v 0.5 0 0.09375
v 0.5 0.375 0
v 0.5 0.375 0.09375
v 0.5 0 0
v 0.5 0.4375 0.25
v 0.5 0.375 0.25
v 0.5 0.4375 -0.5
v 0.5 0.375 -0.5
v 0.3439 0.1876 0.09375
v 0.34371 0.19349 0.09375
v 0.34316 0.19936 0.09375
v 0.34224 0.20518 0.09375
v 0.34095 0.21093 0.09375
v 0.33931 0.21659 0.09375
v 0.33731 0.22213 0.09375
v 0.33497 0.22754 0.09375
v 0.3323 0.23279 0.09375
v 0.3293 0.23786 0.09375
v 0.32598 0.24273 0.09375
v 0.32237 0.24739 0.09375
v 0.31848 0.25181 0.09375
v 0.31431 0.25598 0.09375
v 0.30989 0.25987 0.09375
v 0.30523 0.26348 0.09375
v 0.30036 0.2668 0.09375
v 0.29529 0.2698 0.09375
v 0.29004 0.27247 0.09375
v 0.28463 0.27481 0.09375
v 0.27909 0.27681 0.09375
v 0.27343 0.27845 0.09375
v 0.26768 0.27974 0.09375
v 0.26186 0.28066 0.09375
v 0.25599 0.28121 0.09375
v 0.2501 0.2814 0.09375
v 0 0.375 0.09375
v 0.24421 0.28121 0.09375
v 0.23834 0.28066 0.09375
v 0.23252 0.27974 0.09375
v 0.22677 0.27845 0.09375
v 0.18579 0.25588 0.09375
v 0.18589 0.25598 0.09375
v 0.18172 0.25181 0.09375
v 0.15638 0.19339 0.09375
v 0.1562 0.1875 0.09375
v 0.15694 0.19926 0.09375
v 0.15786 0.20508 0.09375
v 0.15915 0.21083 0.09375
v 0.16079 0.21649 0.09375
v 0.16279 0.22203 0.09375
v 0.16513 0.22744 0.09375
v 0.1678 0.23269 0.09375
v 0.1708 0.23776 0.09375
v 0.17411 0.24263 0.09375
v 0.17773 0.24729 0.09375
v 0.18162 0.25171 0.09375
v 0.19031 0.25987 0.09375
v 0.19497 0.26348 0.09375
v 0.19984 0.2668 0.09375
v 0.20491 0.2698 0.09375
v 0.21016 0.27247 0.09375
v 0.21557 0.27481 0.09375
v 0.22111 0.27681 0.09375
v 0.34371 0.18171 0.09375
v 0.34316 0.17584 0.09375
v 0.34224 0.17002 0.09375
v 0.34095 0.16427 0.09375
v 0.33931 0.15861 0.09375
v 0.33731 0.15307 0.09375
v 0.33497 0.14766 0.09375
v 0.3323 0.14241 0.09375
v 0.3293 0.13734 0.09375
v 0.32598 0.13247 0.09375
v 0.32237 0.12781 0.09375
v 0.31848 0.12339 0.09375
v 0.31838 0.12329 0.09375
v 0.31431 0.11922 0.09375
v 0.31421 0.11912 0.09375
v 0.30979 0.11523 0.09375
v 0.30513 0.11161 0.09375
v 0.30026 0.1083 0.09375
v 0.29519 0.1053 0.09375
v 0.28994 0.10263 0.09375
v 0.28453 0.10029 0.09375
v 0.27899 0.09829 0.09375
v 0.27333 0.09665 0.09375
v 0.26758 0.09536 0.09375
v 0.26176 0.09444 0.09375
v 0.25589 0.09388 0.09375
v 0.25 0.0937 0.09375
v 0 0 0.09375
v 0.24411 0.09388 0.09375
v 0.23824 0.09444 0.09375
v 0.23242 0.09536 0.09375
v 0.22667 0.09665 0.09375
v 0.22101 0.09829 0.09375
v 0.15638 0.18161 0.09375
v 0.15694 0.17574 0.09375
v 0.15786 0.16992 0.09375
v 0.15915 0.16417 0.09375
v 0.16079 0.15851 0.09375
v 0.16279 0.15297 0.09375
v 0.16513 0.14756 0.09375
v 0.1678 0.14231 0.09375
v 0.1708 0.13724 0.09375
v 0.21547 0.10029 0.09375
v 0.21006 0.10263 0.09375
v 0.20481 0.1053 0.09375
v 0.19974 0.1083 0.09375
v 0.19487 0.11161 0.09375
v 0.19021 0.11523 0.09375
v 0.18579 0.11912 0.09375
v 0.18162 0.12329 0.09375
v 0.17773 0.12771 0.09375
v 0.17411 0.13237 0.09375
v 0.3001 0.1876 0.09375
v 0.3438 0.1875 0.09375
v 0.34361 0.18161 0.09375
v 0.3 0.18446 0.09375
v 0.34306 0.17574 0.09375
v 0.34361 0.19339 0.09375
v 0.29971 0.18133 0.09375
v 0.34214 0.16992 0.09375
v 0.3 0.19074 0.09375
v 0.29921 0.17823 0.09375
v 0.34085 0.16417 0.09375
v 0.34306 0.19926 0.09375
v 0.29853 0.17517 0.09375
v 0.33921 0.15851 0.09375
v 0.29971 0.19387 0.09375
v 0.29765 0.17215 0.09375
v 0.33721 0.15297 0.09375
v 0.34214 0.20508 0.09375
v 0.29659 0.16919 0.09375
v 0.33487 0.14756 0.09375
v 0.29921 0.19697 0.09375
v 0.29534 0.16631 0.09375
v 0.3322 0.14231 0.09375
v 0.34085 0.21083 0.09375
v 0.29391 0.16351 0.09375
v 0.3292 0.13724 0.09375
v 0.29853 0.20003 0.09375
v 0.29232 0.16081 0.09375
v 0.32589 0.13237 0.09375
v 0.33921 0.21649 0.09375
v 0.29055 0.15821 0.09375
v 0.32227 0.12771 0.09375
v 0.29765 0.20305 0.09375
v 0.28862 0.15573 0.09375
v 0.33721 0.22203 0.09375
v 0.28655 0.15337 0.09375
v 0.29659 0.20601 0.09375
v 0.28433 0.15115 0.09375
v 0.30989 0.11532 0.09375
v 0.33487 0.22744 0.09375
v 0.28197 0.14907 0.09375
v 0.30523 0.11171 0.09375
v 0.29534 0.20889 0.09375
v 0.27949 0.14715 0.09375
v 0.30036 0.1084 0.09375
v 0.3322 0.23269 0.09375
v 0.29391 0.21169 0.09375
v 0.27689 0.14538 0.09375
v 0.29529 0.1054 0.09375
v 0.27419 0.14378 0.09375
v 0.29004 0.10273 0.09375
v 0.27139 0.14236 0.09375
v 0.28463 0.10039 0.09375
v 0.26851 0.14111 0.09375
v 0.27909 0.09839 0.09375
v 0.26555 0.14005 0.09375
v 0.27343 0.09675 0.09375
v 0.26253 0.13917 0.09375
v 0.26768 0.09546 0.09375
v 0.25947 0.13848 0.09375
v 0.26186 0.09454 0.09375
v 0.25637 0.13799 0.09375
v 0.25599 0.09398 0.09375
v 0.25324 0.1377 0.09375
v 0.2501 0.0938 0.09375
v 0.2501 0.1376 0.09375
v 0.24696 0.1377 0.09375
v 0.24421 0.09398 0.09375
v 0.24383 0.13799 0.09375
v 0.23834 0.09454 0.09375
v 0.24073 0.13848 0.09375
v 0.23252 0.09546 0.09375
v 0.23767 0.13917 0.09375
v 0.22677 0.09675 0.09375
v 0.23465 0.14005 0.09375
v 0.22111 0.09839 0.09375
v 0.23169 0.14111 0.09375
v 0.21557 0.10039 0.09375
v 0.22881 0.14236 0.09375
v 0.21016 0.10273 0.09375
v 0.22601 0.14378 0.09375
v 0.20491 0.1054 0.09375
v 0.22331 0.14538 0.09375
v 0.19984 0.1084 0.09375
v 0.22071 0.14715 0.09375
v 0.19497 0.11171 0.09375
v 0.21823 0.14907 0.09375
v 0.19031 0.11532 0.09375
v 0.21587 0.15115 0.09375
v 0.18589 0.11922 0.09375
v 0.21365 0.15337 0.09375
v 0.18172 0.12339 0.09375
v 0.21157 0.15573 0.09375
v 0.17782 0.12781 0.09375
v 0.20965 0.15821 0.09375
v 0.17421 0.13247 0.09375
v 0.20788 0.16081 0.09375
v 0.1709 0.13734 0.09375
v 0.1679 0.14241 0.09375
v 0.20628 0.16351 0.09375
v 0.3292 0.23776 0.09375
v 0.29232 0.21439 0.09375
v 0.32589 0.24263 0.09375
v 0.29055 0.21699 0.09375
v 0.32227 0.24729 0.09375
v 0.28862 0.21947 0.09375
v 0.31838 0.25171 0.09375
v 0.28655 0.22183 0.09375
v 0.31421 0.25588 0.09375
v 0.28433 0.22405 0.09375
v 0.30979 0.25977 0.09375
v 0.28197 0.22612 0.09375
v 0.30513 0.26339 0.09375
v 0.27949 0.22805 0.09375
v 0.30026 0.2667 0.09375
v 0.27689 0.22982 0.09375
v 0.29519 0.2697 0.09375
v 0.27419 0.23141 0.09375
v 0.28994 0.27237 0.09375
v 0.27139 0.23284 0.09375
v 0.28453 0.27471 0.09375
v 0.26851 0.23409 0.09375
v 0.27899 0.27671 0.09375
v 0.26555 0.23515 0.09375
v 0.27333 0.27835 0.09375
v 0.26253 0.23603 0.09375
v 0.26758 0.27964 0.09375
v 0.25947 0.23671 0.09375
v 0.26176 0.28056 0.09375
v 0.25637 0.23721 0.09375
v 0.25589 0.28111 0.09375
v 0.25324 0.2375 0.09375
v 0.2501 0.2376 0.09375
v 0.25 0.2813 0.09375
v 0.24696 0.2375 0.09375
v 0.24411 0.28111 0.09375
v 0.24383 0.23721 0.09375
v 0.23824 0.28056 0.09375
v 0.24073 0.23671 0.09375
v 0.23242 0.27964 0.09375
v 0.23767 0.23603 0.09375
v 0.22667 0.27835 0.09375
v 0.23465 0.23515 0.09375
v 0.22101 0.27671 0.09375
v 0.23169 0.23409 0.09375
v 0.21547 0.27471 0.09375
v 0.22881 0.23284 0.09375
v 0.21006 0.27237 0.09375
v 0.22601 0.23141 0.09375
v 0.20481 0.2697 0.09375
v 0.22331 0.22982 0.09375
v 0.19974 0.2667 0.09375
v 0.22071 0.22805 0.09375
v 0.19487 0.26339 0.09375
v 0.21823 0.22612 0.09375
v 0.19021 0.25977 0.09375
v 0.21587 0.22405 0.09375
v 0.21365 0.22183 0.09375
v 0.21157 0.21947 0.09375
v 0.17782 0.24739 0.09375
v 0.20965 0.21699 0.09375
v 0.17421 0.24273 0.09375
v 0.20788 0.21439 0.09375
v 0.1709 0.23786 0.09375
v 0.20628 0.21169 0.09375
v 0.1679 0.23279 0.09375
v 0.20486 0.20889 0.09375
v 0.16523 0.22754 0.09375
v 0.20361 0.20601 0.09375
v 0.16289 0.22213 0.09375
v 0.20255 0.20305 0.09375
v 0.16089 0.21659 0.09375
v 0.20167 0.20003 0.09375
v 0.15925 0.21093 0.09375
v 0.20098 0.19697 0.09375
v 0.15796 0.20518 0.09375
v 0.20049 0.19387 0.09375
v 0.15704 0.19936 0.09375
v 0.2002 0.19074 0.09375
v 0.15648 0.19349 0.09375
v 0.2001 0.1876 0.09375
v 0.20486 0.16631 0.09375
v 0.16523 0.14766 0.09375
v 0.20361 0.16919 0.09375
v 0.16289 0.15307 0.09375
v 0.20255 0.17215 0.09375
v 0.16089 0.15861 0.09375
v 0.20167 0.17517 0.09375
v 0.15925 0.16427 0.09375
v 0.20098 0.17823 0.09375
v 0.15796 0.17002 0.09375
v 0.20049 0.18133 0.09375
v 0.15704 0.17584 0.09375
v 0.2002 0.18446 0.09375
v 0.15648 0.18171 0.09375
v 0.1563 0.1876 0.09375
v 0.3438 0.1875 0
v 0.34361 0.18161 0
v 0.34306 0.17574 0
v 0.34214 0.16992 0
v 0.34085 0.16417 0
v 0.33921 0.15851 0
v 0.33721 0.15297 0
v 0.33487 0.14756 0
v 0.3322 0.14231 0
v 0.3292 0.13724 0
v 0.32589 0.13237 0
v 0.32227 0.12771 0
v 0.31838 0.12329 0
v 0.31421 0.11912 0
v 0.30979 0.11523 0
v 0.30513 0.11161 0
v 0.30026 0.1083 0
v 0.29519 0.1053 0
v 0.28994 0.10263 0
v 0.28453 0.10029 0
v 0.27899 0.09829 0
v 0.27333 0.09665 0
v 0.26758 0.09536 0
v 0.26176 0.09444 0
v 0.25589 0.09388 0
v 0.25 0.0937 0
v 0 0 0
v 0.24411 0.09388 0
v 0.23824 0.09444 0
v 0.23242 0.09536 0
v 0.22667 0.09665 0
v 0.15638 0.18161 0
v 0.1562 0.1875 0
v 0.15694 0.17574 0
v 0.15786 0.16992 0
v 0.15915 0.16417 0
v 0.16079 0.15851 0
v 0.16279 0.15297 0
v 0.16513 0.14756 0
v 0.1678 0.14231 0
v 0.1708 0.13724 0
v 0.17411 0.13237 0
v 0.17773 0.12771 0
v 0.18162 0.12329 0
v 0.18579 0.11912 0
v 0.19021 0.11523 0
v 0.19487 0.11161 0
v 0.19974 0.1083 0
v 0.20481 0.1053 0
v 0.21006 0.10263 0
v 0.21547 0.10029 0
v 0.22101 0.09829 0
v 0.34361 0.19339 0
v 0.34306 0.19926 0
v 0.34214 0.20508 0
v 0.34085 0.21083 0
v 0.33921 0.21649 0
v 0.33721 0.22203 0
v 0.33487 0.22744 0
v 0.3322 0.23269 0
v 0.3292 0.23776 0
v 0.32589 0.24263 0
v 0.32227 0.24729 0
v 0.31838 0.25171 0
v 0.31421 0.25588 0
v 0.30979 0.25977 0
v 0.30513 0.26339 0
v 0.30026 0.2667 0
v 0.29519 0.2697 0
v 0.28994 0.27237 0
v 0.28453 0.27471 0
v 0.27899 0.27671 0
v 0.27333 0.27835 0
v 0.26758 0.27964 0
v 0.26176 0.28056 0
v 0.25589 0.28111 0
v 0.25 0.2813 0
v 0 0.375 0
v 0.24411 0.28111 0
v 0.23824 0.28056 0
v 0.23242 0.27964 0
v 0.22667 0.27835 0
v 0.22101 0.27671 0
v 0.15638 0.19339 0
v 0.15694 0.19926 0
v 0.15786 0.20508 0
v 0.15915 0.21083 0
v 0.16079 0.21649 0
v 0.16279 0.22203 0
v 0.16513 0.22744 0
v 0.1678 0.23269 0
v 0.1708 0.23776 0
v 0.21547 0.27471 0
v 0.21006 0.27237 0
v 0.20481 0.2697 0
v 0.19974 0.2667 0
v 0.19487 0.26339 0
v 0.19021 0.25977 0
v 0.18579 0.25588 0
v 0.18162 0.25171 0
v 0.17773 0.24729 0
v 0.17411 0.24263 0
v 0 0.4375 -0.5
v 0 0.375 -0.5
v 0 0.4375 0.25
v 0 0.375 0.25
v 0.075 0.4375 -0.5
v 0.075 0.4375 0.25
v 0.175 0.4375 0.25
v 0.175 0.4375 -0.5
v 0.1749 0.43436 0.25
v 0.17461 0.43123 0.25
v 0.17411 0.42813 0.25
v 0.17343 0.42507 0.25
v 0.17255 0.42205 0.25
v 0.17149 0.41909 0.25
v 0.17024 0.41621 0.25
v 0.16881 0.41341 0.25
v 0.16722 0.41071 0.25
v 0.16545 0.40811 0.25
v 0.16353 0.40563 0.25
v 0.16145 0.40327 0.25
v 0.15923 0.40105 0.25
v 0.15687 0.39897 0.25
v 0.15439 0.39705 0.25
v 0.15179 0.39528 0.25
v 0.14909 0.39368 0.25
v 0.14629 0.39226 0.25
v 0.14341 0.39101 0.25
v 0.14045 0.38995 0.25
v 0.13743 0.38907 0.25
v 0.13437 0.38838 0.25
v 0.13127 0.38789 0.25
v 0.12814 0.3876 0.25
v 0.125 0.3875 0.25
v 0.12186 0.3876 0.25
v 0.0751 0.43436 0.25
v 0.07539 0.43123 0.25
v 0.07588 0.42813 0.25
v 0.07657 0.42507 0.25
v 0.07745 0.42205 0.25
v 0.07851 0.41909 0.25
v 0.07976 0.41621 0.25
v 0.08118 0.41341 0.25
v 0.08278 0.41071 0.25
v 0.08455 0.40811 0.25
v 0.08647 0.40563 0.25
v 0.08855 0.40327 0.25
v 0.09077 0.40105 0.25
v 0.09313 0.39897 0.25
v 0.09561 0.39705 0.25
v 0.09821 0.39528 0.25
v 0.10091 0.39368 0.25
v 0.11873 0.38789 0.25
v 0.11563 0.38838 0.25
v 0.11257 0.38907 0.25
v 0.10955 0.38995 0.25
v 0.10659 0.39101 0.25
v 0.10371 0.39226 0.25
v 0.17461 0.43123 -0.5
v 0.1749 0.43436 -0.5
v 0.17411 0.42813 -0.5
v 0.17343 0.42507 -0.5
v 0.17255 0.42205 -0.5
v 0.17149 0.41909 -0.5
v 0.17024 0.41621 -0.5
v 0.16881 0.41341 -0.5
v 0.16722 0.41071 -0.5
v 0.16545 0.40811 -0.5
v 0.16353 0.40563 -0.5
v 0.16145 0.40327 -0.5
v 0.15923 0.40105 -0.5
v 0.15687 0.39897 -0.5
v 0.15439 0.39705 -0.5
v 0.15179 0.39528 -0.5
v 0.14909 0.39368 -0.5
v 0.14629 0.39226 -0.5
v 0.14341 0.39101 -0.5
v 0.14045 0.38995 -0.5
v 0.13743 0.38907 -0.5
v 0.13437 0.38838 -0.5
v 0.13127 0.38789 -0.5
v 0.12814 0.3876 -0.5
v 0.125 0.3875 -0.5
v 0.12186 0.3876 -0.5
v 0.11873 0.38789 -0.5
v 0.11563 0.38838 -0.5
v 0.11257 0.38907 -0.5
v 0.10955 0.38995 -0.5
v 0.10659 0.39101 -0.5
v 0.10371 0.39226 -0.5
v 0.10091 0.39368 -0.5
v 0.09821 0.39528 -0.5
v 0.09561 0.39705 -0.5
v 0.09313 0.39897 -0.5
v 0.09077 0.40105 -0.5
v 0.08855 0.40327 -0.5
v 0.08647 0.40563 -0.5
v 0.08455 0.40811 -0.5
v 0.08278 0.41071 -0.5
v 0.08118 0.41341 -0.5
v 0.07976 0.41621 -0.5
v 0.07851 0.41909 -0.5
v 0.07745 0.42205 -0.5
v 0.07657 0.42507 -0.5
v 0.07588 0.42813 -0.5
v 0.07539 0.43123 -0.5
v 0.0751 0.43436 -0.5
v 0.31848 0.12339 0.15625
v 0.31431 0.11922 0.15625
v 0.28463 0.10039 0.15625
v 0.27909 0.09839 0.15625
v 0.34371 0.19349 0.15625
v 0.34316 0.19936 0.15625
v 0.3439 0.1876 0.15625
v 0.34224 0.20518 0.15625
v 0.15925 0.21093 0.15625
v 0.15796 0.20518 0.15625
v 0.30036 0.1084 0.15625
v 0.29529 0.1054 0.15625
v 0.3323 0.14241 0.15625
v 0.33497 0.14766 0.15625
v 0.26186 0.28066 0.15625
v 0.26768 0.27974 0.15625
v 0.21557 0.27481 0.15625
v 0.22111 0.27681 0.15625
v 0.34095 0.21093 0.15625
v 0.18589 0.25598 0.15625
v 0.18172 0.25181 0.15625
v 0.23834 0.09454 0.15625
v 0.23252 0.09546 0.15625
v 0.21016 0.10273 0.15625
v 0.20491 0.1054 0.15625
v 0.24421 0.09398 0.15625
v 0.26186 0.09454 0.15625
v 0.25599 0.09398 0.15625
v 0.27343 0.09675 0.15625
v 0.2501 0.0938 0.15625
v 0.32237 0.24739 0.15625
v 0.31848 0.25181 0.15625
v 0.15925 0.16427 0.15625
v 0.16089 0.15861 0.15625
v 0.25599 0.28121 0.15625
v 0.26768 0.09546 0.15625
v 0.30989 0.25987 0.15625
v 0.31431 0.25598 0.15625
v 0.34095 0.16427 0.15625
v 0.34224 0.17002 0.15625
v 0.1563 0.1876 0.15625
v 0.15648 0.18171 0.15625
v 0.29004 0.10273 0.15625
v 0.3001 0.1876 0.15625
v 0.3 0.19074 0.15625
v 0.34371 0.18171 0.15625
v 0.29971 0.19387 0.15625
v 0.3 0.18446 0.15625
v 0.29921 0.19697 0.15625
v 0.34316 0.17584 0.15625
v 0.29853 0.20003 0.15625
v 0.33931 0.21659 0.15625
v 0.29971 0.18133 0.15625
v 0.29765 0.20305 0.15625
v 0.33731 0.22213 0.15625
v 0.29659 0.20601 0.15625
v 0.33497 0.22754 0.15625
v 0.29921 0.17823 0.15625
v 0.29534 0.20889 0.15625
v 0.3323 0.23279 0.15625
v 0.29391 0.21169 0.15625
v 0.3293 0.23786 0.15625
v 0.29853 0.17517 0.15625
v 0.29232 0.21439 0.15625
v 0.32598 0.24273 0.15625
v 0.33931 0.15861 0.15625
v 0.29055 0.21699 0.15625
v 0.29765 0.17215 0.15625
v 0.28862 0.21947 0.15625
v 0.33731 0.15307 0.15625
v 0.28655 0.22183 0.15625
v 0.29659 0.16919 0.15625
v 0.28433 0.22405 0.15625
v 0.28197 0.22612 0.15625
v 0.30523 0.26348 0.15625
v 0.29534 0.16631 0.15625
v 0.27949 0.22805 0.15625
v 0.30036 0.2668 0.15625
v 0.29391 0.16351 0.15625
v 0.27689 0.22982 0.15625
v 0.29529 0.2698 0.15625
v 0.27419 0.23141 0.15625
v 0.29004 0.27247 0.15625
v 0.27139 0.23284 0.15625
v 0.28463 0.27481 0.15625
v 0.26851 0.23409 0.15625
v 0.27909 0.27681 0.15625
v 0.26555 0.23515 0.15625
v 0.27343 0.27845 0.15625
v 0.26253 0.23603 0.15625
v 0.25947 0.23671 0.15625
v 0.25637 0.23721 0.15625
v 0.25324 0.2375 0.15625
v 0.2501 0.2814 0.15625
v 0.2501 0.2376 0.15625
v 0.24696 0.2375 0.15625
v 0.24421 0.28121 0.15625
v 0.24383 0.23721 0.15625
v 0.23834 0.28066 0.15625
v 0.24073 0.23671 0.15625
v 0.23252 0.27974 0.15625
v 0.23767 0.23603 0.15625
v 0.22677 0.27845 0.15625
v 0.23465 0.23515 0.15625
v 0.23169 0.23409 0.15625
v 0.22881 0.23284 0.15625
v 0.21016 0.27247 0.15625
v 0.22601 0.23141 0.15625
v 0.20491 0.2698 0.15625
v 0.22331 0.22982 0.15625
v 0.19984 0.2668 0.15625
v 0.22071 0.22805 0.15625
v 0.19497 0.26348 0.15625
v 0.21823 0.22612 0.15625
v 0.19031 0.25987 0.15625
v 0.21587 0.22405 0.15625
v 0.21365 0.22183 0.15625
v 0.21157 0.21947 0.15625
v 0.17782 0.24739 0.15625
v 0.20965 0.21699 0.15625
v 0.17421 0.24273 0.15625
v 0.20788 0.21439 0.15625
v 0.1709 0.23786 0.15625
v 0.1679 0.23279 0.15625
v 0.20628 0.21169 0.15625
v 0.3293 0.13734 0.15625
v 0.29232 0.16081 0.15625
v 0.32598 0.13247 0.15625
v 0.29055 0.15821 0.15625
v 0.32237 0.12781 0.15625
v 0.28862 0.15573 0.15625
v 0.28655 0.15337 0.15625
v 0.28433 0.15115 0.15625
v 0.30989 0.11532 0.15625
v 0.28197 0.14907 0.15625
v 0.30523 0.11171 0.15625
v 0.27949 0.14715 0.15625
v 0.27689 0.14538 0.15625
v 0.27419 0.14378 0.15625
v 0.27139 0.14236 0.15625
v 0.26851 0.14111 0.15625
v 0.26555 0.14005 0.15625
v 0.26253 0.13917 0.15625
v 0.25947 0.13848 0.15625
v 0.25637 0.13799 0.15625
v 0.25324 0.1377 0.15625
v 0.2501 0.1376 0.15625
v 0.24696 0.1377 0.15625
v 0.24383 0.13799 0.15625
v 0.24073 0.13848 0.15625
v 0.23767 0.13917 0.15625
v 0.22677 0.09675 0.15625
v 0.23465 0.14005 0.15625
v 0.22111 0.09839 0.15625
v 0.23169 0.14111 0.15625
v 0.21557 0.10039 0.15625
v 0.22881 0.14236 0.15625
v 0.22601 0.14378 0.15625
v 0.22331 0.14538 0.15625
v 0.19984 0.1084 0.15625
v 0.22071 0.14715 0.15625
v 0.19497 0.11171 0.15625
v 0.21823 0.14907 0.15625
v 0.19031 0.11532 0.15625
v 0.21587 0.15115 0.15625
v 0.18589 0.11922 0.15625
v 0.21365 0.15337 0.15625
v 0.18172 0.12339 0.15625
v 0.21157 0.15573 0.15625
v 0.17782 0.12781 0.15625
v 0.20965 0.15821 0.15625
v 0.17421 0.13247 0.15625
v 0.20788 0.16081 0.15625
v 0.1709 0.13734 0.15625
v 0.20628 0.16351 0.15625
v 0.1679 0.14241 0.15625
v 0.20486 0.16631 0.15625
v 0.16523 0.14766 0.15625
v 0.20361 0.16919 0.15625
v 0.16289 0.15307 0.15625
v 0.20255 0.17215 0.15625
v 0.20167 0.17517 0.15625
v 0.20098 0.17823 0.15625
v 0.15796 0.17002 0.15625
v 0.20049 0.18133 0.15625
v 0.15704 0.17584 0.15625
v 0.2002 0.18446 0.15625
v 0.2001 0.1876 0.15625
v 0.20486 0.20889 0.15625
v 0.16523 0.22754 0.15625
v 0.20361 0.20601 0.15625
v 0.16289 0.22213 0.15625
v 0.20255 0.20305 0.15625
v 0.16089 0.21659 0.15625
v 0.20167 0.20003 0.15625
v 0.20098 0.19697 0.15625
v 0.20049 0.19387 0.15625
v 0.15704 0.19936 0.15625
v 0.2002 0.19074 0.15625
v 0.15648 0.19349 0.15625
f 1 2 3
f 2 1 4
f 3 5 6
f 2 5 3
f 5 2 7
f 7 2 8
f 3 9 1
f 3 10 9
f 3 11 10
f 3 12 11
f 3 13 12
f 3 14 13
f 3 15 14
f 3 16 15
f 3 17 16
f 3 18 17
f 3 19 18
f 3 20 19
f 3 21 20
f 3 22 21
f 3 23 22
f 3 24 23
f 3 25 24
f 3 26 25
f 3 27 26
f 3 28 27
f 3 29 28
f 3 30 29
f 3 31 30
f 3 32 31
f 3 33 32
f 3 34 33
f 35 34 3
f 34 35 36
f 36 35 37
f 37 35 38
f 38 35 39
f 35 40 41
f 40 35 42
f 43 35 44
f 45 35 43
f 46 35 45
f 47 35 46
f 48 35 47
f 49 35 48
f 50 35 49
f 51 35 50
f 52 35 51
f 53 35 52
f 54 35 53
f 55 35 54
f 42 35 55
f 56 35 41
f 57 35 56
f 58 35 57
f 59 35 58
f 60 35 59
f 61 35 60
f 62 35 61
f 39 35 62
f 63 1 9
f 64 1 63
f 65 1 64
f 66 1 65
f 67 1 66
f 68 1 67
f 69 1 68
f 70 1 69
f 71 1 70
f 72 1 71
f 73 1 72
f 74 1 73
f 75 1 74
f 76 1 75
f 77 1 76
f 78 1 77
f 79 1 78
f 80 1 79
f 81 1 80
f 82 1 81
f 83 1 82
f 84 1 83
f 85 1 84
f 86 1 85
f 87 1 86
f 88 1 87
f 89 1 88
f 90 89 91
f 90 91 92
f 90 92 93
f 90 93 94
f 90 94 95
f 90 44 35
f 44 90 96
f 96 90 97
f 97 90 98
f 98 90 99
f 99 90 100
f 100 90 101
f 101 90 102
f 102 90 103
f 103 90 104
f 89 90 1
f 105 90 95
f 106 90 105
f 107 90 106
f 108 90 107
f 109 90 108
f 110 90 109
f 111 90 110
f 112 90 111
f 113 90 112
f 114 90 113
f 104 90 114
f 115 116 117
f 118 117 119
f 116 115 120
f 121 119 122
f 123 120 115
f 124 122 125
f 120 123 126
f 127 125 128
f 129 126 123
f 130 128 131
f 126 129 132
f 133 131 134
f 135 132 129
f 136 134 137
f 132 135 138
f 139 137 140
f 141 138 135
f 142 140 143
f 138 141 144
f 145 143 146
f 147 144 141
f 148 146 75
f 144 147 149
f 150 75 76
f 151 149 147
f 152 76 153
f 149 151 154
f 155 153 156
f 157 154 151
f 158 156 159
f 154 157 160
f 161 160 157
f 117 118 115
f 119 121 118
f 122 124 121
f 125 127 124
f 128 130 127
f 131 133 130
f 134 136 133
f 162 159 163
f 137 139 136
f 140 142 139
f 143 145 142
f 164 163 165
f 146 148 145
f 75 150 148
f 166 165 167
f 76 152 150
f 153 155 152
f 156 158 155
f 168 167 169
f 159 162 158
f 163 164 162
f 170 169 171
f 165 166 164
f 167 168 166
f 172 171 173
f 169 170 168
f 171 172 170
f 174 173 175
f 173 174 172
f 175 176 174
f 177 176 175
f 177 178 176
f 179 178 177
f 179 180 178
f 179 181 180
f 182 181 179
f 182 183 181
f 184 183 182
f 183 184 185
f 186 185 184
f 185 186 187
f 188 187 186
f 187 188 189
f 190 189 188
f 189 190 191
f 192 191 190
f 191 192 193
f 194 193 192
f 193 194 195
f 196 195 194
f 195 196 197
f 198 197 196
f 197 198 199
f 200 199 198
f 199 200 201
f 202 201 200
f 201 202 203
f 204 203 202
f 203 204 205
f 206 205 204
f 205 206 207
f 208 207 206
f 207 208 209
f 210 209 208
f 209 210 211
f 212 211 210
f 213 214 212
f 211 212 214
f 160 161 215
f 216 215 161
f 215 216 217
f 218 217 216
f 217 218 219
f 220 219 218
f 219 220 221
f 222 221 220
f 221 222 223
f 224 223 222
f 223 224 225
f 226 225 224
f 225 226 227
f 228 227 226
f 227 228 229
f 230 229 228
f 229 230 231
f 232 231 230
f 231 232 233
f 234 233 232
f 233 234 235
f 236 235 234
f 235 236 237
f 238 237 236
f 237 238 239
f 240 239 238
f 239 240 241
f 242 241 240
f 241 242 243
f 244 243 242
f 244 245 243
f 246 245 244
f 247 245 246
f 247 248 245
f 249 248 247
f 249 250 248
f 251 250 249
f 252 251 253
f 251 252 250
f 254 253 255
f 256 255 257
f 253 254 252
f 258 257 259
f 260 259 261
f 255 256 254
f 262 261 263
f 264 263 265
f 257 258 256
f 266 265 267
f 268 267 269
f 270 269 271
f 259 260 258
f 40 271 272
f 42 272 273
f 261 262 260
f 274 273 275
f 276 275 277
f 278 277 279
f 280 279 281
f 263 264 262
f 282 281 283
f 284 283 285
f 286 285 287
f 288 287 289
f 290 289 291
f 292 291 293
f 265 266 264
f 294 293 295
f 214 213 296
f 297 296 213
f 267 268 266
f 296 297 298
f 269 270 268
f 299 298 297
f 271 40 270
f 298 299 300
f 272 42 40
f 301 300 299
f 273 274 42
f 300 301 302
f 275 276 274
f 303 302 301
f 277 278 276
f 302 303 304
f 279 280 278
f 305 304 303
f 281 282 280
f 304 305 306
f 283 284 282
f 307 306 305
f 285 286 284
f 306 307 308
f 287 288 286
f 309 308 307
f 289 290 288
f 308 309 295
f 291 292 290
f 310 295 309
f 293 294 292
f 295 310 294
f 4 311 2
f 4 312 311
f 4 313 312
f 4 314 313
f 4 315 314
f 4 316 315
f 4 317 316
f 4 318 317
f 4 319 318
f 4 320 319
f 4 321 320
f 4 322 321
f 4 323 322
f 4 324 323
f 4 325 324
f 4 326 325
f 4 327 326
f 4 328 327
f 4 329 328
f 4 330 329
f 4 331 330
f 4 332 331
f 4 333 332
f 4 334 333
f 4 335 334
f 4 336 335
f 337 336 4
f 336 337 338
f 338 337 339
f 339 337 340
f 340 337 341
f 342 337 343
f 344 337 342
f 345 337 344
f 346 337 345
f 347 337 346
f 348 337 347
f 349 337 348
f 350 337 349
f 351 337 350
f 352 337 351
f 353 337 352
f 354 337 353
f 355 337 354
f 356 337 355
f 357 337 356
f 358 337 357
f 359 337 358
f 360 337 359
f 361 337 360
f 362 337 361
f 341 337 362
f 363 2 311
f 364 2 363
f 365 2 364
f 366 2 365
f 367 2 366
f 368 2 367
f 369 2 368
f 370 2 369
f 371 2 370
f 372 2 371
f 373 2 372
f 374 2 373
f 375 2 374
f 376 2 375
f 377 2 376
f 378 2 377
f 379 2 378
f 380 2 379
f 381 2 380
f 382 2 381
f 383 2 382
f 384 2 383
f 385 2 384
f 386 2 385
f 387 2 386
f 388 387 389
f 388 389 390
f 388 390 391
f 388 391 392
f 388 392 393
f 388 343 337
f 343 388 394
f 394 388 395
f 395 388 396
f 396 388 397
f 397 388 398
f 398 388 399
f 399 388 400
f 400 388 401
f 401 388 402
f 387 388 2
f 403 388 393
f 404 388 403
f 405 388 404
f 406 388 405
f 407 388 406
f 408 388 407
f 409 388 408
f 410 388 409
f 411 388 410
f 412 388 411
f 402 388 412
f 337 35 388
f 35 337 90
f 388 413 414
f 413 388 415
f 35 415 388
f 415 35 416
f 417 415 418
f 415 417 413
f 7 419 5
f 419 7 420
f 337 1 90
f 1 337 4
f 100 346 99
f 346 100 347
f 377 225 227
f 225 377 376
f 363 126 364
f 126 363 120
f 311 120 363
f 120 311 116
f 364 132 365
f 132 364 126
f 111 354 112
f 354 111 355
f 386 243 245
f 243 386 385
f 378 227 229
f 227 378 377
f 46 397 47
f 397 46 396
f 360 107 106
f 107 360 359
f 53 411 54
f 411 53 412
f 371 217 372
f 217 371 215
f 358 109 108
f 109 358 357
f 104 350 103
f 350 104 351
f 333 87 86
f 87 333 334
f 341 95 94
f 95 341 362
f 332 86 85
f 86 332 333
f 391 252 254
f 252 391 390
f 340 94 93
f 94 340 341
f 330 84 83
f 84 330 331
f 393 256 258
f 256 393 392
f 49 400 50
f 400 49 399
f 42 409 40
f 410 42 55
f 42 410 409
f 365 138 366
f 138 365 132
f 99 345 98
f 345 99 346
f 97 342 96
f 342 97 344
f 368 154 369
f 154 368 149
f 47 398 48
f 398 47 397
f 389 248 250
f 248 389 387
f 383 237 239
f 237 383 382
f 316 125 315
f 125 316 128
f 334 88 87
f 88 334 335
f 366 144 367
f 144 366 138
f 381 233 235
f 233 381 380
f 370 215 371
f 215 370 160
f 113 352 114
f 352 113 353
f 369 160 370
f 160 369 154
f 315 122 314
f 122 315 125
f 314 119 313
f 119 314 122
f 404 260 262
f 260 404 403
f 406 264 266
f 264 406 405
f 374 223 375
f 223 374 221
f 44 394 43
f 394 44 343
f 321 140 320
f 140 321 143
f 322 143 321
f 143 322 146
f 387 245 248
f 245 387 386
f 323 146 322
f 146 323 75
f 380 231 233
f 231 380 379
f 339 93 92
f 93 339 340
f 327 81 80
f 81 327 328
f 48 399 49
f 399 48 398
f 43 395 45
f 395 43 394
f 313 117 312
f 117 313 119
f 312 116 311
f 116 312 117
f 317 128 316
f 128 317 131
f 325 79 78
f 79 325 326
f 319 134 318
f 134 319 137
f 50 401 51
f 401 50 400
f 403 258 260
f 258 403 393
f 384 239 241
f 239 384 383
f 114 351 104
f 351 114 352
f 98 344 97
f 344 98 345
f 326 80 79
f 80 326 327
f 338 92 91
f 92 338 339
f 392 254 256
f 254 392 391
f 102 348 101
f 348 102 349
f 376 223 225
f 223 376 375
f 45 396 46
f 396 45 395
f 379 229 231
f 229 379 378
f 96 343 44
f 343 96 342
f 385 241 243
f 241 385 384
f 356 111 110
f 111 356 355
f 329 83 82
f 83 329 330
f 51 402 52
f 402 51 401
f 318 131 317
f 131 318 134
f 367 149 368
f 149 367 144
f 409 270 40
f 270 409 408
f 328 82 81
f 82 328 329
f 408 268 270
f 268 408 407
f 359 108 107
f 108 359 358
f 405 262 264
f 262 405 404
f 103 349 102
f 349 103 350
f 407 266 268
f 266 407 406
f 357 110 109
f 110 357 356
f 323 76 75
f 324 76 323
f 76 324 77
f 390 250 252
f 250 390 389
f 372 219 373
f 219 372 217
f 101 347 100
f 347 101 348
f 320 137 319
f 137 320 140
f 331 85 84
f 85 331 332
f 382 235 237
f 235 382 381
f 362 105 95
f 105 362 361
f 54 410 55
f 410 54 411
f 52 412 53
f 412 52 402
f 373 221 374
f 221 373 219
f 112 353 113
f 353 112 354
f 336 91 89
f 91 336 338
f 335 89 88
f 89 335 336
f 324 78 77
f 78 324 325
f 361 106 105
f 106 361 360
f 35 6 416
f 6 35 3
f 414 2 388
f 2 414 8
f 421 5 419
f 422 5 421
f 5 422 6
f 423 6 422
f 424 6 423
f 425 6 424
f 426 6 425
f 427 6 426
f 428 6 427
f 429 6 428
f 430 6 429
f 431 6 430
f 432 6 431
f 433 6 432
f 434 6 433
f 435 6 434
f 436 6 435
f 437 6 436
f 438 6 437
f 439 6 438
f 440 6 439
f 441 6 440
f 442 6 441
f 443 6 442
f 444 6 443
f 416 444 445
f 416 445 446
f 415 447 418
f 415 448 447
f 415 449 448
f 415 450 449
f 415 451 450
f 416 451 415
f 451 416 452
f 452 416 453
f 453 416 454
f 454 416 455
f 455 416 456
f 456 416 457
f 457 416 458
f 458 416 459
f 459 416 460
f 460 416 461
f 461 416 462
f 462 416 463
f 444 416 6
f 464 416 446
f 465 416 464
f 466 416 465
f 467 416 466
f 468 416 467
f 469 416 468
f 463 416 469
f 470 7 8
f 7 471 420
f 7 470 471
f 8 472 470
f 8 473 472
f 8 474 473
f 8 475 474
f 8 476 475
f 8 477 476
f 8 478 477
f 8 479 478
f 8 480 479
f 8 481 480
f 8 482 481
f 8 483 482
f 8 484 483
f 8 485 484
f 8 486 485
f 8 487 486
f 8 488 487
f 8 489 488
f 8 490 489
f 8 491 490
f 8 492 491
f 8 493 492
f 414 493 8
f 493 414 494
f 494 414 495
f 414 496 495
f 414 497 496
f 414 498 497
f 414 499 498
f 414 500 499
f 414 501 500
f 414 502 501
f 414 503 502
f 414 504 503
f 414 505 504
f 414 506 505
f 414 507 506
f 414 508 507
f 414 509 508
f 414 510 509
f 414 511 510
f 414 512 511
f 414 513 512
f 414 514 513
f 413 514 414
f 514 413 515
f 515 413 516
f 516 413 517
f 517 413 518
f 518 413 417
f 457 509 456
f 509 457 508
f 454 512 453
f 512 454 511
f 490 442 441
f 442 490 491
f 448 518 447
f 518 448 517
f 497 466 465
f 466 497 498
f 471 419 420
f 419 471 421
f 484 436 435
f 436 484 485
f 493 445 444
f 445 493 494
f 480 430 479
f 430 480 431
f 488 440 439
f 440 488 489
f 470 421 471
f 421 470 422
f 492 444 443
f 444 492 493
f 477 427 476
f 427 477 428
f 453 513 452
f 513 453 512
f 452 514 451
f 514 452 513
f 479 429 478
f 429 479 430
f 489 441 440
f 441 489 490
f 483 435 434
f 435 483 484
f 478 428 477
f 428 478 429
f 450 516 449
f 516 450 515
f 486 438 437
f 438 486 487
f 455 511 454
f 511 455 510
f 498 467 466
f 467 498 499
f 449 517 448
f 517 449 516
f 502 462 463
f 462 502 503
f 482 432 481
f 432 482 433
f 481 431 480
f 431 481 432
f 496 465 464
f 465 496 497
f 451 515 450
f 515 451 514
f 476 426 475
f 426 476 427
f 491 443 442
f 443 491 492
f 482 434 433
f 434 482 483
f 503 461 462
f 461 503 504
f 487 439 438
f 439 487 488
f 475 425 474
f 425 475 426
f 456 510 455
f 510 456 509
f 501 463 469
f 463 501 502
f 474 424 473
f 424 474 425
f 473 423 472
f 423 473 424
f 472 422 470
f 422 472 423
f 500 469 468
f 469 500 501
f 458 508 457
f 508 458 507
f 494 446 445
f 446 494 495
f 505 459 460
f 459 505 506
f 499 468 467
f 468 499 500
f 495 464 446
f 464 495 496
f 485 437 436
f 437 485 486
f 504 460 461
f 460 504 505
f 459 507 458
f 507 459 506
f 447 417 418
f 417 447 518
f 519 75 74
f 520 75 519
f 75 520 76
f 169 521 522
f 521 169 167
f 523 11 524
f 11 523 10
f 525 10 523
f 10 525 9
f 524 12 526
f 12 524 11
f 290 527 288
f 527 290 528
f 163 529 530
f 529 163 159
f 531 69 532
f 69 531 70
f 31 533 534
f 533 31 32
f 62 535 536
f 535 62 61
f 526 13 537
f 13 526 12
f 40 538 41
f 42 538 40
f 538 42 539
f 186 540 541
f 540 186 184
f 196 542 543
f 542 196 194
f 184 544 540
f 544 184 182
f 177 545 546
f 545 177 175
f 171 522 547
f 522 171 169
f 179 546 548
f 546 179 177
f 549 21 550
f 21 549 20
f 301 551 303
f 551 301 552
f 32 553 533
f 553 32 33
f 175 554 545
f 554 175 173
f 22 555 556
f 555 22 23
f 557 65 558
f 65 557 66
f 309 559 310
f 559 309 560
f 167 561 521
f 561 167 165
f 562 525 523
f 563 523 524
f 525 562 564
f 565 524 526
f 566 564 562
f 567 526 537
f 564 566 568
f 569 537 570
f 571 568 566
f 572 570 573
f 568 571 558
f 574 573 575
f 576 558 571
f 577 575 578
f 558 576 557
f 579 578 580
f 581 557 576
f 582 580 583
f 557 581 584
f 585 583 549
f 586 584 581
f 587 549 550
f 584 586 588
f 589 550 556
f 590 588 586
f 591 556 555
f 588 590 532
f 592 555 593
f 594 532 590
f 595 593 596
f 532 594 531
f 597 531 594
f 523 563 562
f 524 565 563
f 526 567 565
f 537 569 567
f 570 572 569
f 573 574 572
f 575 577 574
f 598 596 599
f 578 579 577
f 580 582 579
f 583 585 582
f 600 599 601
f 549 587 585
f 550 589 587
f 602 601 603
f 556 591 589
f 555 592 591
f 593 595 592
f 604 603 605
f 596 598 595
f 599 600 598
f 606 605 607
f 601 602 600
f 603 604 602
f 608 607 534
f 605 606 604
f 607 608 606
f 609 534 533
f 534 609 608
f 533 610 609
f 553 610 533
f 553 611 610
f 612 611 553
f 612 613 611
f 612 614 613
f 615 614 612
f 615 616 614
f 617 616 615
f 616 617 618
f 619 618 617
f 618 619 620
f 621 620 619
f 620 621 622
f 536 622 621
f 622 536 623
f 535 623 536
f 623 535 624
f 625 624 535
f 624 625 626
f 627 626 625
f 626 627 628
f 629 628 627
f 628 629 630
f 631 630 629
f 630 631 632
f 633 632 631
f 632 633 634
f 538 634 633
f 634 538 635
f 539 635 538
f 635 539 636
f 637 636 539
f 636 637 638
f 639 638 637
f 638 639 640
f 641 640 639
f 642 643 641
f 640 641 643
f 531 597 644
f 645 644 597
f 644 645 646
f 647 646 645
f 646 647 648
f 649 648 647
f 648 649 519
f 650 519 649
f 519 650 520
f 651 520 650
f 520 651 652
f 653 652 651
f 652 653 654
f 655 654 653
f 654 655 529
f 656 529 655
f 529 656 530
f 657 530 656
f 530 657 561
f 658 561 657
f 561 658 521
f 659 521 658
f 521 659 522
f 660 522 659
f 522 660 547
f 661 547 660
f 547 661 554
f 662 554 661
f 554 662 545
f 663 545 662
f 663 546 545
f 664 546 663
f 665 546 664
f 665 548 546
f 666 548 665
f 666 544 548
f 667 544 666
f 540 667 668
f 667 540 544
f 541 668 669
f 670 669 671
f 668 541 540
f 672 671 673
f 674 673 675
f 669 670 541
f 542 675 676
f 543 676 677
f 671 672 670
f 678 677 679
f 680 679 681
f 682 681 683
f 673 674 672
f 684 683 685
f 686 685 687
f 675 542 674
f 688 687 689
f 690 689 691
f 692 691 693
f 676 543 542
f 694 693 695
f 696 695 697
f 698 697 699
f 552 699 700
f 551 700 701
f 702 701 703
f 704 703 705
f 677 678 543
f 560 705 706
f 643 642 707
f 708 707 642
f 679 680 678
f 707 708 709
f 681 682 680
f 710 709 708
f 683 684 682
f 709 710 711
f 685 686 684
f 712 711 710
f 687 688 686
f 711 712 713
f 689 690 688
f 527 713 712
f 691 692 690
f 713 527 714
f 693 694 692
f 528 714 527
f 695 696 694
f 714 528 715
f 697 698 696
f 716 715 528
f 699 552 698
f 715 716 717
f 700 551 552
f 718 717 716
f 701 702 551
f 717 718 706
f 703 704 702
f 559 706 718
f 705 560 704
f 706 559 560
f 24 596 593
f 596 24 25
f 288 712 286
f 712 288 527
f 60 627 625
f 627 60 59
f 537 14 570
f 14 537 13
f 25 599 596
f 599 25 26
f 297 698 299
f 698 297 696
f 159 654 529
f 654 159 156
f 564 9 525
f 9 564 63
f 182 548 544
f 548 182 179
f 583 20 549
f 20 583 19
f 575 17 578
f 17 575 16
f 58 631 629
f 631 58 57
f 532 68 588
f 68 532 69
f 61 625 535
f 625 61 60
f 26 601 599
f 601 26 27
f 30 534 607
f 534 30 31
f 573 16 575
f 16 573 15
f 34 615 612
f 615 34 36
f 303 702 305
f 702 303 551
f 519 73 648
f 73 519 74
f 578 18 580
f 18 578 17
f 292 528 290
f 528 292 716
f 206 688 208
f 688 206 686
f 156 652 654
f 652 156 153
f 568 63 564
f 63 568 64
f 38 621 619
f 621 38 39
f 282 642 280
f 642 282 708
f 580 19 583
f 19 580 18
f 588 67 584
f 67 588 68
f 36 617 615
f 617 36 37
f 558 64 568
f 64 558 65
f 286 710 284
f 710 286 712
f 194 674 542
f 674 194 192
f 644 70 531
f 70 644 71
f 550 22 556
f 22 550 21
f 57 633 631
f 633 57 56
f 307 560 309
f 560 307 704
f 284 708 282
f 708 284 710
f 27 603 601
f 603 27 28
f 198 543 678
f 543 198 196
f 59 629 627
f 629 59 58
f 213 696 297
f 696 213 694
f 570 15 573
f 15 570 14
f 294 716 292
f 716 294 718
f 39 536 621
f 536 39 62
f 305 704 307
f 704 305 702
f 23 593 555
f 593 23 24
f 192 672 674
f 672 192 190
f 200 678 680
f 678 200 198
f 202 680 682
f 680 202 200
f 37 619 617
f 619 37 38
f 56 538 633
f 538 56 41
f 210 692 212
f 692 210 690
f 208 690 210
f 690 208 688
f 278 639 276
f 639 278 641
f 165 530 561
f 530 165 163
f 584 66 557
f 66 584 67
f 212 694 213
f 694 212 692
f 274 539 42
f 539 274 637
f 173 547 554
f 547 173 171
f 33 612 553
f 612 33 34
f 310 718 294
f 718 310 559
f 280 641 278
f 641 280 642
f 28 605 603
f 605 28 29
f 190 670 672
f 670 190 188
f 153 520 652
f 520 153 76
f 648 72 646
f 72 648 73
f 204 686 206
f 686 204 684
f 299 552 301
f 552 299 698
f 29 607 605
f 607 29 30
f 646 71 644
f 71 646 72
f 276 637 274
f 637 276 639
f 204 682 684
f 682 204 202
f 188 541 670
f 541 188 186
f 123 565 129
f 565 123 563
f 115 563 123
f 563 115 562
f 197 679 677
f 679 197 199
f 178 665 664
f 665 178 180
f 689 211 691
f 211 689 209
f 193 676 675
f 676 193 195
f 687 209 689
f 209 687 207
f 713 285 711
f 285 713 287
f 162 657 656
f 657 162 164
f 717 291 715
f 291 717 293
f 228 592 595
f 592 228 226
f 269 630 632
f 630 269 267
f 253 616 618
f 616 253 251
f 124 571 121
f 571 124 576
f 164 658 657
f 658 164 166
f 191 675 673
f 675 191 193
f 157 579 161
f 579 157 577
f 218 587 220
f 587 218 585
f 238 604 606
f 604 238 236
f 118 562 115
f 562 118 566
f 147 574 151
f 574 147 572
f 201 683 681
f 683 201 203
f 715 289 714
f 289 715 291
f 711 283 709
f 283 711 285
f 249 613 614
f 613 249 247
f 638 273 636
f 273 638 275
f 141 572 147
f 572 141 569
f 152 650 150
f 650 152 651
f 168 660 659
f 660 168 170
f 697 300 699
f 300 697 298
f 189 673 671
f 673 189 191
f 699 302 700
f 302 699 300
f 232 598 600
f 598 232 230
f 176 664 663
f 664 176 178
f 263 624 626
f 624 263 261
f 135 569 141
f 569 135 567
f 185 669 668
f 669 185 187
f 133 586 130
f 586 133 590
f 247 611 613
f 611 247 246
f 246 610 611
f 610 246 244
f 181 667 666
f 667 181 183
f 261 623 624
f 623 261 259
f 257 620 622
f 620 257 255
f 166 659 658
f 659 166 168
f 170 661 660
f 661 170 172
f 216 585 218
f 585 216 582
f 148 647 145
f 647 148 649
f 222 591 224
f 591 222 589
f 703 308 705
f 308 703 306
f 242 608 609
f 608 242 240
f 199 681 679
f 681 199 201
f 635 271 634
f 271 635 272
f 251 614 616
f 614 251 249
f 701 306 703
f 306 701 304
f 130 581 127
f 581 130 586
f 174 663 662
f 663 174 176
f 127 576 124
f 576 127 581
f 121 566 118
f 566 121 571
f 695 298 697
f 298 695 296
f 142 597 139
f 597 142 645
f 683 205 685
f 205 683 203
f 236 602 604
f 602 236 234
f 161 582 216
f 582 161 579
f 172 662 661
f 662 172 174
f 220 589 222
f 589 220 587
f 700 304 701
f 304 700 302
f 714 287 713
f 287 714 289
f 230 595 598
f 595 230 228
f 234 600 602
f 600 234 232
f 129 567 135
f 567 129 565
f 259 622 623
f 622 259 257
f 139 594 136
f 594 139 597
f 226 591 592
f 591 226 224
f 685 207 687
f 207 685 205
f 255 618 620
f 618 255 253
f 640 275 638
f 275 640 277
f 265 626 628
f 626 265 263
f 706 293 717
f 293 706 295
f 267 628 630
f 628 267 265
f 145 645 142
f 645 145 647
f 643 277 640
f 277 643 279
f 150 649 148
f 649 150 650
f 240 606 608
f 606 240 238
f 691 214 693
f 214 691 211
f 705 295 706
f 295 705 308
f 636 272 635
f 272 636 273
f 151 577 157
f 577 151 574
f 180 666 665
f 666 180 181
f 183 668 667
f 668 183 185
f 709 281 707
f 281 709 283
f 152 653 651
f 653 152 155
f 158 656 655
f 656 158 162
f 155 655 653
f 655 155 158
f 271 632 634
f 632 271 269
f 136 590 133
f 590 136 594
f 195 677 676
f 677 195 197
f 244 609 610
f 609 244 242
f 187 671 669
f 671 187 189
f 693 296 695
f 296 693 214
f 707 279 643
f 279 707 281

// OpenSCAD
// Parameters
$fn = 100;
cut_clearance = 0.0005;

// Main base
base_length = 0.5;
base_width = 0.4375;
base_height = 0.09375;      // nominal extrusion depth 0.0938
base_z_min = 0;
base_z_max = base_z_min + base_height;

// Base circular opening
base_hole_cx = 0.25;
base_hole_cy = 0.1875;
base_hole_radius = 0.0938;

// Back-edge strip footprint
back_strip_length = 0.5;
back_strip_front_offset = 0.375;
back_strip_back_offset = 0;
back_strip_width = base_width - back_strip_front_offset - back_strip_back_offset;
back_strip_x_min = 0;
back_strip_y_min = back_strip_front_offset;

// Underside strip depth
under_strip_z_min = -0.25;
under_strip_z_max = 0;

// Tall back-edge solid
back_solid_z_min = -0.5;
back_solid_z_max = 0.25;

// Back-edge circular void
back_void_cx = 0.125;
back_void_cy = 0.4375;
back_void_radius = 0.05;

// Upper annular collar
collar_cx = 0.2501;
collar_cy = 0.1876;
collar_outer_radius = 0.0938;
collar_inner_radius = 0.05;
collar_height = 0.0625;
collar_z_min = base_z_max;
collar_z_max = collar_z_min + collar_height;

// Helper: box from minimum corner
module box_at(x, y, z, l, w, h) {
    translate([x, y, z])
        cube([l, w, h], center=false);
}

// Helper: vertical cylindrical cut
module z_cylinder_cut(cx, cy, z_min, z_max, r) {
    translate([cx, cy, z_min - cut_clearance])
        cylinder(h=(z_max - z_min) + 2 * cut_clearance, r=r, center=false);
}

// Main base with true circular through-opening
module main_base() {
    difference() {
        box_at(0, 0, base_z_min, base_length, base_width, base_height);
        z_cylinder_cut(base_hole_cx, base_hole_cy, base_z_min, base_z_max, base_hole_radius);
    }
}

// Full-length underside strip along the back edge
module underside_back_strip() {
    box_at(
        back_strip_x_min,
        back_strip_y_min,
        under_strip_z_min,
        back_strip_length,
        back_strip_width,
        under_strip_z_max - under_strip_z_min
    );
}

// Tall back-edge solid over the same footprint
module tall_back_solid() {
    box_at(
        back_strip_x_min,
        back_strip_y_min,
        back_solid_z_min,
        back_strip_length,
        back_strip_width,
        back_solid_z_max - back_solid_z_min
    );
}

// Lower body with back-edge circular void cut through the solids
module lower_body() {
    difference() {
        union() {
            main_base();
            underside_back_strip();
            tall_back_solid();
        }
        z_cylinder_cut(back_void_cx, back_void_cy, back_solid_z_min, back_solid_z_max, back_void_radius);
    }
}

// Upper annular collar
module annular_collar() {
    difference() {
        translate([collar_cx, collar_cy, collar_z_min])
            cylinder(h=collar_height, r=collar_outer_radius, center=false);

        z_cylinder_cut(collar_cx, collar_cy, collar_z_min, collar_z_max, collar_inner_radius);
    }
}

// Final model
union() {
    lower_body();
    annular_collar();
}
